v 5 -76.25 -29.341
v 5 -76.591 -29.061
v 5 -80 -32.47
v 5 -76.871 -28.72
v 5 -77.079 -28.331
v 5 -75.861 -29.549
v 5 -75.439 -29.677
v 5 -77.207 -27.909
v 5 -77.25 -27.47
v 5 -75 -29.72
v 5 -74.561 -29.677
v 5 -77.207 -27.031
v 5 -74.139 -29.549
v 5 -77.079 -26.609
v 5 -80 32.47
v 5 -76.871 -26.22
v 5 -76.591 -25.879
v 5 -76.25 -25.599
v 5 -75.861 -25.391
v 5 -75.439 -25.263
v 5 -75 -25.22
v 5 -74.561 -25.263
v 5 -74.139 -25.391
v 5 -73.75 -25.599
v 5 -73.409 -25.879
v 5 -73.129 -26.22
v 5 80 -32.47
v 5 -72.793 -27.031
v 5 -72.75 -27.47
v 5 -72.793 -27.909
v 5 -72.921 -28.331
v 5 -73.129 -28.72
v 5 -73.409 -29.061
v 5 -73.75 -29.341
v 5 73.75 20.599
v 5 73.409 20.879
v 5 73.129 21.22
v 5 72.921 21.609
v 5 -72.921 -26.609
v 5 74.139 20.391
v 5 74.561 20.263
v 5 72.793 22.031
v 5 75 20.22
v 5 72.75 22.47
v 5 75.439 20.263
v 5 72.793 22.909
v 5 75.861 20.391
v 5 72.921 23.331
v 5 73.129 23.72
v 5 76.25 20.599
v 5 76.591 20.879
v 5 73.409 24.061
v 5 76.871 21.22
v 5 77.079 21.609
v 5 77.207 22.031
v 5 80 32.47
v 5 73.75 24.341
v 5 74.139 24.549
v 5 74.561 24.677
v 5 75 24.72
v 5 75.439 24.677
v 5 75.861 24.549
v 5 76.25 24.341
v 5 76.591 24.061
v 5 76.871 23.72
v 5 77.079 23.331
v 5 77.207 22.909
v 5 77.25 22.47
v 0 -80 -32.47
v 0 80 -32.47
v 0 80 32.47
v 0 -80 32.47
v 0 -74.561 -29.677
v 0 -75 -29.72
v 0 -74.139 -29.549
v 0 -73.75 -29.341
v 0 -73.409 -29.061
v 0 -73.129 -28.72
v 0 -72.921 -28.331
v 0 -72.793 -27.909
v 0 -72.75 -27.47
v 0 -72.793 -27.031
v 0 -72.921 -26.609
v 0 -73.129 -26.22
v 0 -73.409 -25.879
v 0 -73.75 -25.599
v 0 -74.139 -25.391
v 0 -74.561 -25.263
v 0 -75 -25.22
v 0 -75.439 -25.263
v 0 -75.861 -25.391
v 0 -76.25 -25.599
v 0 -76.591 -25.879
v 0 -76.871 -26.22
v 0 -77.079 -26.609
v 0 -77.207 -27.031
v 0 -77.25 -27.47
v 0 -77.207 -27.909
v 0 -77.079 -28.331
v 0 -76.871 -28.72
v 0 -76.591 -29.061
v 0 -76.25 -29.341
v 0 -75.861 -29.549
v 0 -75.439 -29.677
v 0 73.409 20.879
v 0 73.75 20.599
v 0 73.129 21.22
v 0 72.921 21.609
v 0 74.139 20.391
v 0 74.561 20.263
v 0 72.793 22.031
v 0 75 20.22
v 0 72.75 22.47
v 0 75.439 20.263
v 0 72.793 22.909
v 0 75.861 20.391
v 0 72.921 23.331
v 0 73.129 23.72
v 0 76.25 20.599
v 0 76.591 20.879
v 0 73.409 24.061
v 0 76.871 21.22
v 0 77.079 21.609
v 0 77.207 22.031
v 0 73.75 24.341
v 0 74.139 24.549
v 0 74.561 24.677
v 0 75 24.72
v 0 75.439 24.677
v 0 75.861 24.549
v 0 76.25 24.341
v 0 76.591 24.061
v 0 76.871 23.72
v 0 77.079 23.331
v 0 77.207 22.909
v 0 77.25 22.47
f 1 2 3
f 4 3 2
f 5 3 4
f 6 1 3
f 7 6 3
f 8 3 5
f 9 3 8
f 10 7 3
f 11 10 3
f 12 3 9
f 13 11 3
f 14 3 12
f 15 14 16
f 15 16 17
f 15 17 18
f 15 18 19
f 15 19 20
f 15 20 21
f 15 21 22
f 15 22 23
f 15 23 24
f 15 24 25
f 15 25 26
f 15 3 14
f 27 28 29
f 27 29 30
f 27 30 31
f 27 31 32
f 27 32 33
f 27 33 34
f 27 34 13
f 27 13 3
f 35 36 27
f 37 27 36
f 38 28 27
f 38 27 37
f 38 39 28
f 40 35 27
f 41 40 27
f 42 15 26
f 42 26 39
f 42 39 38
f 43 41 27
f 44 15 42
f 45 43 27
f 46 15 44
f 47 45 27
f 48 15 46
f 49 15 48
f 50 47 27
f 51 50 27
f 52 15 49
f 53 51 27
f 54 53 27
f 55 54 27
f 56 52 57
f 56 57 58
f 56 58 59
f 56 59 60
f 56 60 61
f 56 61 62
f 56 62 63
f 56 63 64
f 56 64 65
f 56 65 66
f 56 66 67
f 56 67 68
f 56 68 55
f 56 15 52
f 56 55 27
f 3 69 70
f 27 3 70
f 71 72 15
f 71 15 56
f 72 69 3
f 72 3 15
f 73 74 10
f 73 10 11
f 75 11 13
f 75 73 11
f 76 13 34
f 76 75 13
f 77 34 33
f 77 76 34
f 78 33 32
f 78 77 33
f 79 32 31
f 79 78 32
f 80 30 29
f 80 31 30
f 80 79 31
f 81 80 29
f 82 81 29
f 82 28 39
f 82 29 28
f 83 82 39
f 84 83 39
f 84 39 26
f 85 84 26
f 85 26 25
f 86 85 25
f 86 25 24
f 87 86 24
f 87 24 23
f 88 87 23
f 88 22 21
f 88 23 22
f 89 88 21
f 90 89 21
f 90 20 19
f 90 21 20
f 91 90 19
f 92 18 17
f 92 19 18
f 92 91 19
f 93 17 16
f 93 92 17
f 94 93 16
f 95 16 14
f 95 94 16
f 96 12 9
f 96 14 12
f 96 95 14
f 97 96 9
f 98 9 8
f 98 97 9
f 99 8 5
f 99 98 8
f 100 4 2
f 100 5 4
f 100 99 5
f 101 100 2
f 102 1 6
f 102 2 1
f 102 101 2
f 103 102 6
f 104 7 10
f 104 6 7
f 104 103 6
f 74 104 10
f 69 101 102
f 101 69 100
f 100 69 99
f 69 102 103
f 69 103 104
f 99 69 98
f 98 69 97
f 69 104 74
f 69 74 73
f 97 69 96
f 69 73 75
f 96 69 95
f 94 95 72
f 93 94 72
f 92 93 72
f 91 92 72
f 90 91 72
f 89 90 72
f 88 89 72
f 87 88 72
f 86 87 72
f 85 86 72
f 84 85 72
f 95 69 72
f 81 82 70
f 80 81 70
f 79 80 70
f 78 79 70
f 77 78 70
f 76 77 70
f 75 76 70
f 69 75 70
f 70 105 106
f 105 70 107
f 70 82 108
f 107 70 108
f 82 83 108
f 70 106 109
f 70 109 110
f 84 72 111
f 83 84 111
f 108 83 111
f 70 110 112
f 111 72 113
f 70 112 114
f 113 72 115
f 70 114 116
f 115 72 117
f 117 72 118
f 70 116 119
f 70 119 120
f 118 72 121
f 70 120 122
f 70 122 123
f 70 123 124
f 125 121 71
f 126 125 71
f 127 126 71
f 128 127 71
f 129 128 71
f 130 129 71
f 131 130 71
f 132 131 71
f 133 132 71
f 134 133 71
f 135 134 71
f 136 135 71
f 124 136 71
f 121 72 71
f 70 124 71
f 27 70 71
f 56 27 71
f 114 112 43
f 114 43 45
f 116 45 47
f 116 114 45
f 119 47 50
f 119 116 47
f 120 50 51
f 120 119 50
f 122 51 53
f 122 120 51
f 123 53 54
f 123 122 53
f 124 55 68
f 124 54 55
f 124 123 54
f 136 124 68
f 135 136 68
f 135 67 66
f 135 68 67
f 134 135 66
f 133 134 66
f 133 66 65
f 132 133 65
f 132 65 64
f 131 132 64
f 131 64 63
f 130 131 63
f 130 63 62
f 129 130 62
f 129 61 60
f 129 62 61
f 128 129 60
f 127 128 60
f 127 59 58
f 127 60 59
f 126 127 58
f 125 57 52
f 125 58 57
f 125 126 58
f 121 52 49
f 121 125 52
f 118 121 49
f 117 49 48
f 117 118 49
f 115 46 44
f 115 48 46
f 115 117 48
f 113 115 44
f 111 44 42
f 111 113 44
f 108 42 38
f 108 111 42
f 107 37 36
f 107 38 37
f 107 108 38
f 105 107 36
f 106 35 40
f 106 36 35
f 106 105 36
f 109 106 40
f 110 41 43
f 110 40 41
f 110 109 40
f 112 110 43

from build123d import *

# Parameters (mm, degrees)
SKETCH1_W               = 160
SKETCH1_H               = 64.94
BOSS_EXTRUDE1_DEPTH     = 5
CUT_EXTRUDE1_DEPTH      = 87.482951499
CUT_EXTRUDE1_DEPTH_BACK = 87.482951499
SKETCH2_R               = 2.25


with BuildPart() as part:
    # Sketch1 → Boss-Extrude1 (new body)
    with BuildSketch(Plane.YZ):
        Rectangle(SKETCH1_W, SKETCH1_H)
    extrude(amount=BOSS_EXTRUDE1_DEPTH)

    # Sketch2 → Cut-Extrude1 (cut, two sides: drawn at the far end of the back side and taken through both)
    with BuildSketch(Plane.YZ.offset(5).offset(-CUT_EXTRUDE1_DEPTH_BACK)):
        with Locations(Location((-75, -27.47, 0), (0, 0, 270))):
            Circle(SKETCH2_R)
        with Locations(Location((75, 22.47, 0), (0, 0, 270))):
            Circle(SKETCH2_R)
    extrude(amount=CUT_EXTRUDE1_DEPTH + CUT_EXTRUDE1_DEPTH_BACK, mode=Mode.SUBTRACT)


solid = part.part
